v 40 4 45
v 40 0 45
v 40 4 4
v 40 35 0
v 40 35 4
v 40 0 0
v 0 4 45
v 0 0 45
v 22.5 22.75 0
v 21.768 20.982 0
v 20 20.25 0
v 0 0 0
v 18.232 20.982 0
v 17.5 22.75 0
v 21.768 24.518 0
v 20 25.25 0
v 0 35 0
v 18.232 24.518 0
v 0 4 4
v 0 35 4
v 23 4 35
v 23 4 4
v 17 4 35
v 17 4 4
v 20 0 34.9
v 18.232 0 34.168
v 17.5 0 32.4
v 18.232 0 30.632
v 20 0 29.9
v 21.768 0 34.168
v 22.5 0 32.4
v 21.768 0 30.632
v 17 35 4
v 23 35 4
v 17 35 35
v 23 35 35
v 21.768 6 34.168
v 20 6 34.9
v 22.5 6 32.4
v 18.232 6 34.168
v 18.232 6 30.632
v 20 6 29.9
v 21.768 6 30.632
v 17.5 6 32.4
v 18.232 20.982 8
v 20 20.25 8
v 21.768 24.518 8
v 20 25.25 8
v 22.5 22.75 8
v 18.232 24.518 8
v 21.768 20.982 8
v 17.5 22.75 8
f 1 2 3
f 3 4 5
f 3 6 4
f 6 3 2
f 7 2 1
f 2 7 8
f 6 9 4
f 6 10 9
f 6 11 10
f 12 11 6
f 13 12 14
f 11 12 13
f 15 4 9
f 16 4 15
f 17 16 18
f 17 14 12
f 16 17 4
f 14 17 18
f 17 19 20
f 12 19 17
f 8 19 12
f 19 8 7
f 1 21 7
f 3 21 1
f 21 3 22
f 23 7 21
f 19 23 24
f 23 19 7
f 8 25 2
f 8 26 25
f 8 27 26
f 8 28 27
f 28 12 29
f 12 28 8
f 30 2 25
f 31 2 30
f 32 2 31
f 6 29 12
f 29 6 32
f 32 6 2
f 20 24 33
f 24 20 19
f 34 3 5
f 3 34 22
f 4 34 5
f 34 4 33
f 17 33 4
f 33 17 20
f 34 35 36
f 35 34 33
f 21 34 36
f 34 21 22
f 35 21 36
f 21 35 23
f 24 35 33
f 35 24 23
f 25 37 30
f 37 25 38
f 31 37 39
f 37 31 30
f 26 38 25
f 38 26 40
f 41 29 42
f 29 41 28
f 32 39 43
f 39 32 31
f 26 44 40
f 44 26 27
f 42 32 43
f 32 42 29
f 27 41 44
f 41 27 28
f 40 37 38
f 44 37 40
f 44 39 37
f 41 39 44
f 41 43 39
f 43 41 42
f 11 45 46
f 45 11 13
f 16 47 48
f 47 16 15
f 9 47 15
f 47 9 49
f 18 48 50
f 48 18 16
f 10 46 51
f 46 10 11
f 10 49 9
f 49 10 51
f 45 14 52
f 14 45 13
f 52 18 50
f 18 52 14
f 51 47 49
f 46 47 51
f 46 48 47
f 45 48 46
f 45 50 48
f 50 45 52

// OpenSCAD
// Базовый L-кронштейн (стартовая деталь для маховика данных)
width = 40; height = 45; thickness = 4; hole_d = 5; rib = 6; leg = 35;

difference() {
  union() {
    cube([width, thickness, height], center=false);
    cube([width, leg, thickness], center=false);
    translate([width/2 - rib/2, 0, 0]) cube([rib, leg, leg], center=false);
  }
  translate([width/2, thickness/2, height*0.72]) rotate([90, 0, 0])
    translate([0, 0, -thickness]) cylinder(h=thickness*3, r=hole_d/2);
  translate([width/2, leg*0.65, thickness/2]) cylinder(h=thickness*3, r=hole_d/2, center=true);
}
